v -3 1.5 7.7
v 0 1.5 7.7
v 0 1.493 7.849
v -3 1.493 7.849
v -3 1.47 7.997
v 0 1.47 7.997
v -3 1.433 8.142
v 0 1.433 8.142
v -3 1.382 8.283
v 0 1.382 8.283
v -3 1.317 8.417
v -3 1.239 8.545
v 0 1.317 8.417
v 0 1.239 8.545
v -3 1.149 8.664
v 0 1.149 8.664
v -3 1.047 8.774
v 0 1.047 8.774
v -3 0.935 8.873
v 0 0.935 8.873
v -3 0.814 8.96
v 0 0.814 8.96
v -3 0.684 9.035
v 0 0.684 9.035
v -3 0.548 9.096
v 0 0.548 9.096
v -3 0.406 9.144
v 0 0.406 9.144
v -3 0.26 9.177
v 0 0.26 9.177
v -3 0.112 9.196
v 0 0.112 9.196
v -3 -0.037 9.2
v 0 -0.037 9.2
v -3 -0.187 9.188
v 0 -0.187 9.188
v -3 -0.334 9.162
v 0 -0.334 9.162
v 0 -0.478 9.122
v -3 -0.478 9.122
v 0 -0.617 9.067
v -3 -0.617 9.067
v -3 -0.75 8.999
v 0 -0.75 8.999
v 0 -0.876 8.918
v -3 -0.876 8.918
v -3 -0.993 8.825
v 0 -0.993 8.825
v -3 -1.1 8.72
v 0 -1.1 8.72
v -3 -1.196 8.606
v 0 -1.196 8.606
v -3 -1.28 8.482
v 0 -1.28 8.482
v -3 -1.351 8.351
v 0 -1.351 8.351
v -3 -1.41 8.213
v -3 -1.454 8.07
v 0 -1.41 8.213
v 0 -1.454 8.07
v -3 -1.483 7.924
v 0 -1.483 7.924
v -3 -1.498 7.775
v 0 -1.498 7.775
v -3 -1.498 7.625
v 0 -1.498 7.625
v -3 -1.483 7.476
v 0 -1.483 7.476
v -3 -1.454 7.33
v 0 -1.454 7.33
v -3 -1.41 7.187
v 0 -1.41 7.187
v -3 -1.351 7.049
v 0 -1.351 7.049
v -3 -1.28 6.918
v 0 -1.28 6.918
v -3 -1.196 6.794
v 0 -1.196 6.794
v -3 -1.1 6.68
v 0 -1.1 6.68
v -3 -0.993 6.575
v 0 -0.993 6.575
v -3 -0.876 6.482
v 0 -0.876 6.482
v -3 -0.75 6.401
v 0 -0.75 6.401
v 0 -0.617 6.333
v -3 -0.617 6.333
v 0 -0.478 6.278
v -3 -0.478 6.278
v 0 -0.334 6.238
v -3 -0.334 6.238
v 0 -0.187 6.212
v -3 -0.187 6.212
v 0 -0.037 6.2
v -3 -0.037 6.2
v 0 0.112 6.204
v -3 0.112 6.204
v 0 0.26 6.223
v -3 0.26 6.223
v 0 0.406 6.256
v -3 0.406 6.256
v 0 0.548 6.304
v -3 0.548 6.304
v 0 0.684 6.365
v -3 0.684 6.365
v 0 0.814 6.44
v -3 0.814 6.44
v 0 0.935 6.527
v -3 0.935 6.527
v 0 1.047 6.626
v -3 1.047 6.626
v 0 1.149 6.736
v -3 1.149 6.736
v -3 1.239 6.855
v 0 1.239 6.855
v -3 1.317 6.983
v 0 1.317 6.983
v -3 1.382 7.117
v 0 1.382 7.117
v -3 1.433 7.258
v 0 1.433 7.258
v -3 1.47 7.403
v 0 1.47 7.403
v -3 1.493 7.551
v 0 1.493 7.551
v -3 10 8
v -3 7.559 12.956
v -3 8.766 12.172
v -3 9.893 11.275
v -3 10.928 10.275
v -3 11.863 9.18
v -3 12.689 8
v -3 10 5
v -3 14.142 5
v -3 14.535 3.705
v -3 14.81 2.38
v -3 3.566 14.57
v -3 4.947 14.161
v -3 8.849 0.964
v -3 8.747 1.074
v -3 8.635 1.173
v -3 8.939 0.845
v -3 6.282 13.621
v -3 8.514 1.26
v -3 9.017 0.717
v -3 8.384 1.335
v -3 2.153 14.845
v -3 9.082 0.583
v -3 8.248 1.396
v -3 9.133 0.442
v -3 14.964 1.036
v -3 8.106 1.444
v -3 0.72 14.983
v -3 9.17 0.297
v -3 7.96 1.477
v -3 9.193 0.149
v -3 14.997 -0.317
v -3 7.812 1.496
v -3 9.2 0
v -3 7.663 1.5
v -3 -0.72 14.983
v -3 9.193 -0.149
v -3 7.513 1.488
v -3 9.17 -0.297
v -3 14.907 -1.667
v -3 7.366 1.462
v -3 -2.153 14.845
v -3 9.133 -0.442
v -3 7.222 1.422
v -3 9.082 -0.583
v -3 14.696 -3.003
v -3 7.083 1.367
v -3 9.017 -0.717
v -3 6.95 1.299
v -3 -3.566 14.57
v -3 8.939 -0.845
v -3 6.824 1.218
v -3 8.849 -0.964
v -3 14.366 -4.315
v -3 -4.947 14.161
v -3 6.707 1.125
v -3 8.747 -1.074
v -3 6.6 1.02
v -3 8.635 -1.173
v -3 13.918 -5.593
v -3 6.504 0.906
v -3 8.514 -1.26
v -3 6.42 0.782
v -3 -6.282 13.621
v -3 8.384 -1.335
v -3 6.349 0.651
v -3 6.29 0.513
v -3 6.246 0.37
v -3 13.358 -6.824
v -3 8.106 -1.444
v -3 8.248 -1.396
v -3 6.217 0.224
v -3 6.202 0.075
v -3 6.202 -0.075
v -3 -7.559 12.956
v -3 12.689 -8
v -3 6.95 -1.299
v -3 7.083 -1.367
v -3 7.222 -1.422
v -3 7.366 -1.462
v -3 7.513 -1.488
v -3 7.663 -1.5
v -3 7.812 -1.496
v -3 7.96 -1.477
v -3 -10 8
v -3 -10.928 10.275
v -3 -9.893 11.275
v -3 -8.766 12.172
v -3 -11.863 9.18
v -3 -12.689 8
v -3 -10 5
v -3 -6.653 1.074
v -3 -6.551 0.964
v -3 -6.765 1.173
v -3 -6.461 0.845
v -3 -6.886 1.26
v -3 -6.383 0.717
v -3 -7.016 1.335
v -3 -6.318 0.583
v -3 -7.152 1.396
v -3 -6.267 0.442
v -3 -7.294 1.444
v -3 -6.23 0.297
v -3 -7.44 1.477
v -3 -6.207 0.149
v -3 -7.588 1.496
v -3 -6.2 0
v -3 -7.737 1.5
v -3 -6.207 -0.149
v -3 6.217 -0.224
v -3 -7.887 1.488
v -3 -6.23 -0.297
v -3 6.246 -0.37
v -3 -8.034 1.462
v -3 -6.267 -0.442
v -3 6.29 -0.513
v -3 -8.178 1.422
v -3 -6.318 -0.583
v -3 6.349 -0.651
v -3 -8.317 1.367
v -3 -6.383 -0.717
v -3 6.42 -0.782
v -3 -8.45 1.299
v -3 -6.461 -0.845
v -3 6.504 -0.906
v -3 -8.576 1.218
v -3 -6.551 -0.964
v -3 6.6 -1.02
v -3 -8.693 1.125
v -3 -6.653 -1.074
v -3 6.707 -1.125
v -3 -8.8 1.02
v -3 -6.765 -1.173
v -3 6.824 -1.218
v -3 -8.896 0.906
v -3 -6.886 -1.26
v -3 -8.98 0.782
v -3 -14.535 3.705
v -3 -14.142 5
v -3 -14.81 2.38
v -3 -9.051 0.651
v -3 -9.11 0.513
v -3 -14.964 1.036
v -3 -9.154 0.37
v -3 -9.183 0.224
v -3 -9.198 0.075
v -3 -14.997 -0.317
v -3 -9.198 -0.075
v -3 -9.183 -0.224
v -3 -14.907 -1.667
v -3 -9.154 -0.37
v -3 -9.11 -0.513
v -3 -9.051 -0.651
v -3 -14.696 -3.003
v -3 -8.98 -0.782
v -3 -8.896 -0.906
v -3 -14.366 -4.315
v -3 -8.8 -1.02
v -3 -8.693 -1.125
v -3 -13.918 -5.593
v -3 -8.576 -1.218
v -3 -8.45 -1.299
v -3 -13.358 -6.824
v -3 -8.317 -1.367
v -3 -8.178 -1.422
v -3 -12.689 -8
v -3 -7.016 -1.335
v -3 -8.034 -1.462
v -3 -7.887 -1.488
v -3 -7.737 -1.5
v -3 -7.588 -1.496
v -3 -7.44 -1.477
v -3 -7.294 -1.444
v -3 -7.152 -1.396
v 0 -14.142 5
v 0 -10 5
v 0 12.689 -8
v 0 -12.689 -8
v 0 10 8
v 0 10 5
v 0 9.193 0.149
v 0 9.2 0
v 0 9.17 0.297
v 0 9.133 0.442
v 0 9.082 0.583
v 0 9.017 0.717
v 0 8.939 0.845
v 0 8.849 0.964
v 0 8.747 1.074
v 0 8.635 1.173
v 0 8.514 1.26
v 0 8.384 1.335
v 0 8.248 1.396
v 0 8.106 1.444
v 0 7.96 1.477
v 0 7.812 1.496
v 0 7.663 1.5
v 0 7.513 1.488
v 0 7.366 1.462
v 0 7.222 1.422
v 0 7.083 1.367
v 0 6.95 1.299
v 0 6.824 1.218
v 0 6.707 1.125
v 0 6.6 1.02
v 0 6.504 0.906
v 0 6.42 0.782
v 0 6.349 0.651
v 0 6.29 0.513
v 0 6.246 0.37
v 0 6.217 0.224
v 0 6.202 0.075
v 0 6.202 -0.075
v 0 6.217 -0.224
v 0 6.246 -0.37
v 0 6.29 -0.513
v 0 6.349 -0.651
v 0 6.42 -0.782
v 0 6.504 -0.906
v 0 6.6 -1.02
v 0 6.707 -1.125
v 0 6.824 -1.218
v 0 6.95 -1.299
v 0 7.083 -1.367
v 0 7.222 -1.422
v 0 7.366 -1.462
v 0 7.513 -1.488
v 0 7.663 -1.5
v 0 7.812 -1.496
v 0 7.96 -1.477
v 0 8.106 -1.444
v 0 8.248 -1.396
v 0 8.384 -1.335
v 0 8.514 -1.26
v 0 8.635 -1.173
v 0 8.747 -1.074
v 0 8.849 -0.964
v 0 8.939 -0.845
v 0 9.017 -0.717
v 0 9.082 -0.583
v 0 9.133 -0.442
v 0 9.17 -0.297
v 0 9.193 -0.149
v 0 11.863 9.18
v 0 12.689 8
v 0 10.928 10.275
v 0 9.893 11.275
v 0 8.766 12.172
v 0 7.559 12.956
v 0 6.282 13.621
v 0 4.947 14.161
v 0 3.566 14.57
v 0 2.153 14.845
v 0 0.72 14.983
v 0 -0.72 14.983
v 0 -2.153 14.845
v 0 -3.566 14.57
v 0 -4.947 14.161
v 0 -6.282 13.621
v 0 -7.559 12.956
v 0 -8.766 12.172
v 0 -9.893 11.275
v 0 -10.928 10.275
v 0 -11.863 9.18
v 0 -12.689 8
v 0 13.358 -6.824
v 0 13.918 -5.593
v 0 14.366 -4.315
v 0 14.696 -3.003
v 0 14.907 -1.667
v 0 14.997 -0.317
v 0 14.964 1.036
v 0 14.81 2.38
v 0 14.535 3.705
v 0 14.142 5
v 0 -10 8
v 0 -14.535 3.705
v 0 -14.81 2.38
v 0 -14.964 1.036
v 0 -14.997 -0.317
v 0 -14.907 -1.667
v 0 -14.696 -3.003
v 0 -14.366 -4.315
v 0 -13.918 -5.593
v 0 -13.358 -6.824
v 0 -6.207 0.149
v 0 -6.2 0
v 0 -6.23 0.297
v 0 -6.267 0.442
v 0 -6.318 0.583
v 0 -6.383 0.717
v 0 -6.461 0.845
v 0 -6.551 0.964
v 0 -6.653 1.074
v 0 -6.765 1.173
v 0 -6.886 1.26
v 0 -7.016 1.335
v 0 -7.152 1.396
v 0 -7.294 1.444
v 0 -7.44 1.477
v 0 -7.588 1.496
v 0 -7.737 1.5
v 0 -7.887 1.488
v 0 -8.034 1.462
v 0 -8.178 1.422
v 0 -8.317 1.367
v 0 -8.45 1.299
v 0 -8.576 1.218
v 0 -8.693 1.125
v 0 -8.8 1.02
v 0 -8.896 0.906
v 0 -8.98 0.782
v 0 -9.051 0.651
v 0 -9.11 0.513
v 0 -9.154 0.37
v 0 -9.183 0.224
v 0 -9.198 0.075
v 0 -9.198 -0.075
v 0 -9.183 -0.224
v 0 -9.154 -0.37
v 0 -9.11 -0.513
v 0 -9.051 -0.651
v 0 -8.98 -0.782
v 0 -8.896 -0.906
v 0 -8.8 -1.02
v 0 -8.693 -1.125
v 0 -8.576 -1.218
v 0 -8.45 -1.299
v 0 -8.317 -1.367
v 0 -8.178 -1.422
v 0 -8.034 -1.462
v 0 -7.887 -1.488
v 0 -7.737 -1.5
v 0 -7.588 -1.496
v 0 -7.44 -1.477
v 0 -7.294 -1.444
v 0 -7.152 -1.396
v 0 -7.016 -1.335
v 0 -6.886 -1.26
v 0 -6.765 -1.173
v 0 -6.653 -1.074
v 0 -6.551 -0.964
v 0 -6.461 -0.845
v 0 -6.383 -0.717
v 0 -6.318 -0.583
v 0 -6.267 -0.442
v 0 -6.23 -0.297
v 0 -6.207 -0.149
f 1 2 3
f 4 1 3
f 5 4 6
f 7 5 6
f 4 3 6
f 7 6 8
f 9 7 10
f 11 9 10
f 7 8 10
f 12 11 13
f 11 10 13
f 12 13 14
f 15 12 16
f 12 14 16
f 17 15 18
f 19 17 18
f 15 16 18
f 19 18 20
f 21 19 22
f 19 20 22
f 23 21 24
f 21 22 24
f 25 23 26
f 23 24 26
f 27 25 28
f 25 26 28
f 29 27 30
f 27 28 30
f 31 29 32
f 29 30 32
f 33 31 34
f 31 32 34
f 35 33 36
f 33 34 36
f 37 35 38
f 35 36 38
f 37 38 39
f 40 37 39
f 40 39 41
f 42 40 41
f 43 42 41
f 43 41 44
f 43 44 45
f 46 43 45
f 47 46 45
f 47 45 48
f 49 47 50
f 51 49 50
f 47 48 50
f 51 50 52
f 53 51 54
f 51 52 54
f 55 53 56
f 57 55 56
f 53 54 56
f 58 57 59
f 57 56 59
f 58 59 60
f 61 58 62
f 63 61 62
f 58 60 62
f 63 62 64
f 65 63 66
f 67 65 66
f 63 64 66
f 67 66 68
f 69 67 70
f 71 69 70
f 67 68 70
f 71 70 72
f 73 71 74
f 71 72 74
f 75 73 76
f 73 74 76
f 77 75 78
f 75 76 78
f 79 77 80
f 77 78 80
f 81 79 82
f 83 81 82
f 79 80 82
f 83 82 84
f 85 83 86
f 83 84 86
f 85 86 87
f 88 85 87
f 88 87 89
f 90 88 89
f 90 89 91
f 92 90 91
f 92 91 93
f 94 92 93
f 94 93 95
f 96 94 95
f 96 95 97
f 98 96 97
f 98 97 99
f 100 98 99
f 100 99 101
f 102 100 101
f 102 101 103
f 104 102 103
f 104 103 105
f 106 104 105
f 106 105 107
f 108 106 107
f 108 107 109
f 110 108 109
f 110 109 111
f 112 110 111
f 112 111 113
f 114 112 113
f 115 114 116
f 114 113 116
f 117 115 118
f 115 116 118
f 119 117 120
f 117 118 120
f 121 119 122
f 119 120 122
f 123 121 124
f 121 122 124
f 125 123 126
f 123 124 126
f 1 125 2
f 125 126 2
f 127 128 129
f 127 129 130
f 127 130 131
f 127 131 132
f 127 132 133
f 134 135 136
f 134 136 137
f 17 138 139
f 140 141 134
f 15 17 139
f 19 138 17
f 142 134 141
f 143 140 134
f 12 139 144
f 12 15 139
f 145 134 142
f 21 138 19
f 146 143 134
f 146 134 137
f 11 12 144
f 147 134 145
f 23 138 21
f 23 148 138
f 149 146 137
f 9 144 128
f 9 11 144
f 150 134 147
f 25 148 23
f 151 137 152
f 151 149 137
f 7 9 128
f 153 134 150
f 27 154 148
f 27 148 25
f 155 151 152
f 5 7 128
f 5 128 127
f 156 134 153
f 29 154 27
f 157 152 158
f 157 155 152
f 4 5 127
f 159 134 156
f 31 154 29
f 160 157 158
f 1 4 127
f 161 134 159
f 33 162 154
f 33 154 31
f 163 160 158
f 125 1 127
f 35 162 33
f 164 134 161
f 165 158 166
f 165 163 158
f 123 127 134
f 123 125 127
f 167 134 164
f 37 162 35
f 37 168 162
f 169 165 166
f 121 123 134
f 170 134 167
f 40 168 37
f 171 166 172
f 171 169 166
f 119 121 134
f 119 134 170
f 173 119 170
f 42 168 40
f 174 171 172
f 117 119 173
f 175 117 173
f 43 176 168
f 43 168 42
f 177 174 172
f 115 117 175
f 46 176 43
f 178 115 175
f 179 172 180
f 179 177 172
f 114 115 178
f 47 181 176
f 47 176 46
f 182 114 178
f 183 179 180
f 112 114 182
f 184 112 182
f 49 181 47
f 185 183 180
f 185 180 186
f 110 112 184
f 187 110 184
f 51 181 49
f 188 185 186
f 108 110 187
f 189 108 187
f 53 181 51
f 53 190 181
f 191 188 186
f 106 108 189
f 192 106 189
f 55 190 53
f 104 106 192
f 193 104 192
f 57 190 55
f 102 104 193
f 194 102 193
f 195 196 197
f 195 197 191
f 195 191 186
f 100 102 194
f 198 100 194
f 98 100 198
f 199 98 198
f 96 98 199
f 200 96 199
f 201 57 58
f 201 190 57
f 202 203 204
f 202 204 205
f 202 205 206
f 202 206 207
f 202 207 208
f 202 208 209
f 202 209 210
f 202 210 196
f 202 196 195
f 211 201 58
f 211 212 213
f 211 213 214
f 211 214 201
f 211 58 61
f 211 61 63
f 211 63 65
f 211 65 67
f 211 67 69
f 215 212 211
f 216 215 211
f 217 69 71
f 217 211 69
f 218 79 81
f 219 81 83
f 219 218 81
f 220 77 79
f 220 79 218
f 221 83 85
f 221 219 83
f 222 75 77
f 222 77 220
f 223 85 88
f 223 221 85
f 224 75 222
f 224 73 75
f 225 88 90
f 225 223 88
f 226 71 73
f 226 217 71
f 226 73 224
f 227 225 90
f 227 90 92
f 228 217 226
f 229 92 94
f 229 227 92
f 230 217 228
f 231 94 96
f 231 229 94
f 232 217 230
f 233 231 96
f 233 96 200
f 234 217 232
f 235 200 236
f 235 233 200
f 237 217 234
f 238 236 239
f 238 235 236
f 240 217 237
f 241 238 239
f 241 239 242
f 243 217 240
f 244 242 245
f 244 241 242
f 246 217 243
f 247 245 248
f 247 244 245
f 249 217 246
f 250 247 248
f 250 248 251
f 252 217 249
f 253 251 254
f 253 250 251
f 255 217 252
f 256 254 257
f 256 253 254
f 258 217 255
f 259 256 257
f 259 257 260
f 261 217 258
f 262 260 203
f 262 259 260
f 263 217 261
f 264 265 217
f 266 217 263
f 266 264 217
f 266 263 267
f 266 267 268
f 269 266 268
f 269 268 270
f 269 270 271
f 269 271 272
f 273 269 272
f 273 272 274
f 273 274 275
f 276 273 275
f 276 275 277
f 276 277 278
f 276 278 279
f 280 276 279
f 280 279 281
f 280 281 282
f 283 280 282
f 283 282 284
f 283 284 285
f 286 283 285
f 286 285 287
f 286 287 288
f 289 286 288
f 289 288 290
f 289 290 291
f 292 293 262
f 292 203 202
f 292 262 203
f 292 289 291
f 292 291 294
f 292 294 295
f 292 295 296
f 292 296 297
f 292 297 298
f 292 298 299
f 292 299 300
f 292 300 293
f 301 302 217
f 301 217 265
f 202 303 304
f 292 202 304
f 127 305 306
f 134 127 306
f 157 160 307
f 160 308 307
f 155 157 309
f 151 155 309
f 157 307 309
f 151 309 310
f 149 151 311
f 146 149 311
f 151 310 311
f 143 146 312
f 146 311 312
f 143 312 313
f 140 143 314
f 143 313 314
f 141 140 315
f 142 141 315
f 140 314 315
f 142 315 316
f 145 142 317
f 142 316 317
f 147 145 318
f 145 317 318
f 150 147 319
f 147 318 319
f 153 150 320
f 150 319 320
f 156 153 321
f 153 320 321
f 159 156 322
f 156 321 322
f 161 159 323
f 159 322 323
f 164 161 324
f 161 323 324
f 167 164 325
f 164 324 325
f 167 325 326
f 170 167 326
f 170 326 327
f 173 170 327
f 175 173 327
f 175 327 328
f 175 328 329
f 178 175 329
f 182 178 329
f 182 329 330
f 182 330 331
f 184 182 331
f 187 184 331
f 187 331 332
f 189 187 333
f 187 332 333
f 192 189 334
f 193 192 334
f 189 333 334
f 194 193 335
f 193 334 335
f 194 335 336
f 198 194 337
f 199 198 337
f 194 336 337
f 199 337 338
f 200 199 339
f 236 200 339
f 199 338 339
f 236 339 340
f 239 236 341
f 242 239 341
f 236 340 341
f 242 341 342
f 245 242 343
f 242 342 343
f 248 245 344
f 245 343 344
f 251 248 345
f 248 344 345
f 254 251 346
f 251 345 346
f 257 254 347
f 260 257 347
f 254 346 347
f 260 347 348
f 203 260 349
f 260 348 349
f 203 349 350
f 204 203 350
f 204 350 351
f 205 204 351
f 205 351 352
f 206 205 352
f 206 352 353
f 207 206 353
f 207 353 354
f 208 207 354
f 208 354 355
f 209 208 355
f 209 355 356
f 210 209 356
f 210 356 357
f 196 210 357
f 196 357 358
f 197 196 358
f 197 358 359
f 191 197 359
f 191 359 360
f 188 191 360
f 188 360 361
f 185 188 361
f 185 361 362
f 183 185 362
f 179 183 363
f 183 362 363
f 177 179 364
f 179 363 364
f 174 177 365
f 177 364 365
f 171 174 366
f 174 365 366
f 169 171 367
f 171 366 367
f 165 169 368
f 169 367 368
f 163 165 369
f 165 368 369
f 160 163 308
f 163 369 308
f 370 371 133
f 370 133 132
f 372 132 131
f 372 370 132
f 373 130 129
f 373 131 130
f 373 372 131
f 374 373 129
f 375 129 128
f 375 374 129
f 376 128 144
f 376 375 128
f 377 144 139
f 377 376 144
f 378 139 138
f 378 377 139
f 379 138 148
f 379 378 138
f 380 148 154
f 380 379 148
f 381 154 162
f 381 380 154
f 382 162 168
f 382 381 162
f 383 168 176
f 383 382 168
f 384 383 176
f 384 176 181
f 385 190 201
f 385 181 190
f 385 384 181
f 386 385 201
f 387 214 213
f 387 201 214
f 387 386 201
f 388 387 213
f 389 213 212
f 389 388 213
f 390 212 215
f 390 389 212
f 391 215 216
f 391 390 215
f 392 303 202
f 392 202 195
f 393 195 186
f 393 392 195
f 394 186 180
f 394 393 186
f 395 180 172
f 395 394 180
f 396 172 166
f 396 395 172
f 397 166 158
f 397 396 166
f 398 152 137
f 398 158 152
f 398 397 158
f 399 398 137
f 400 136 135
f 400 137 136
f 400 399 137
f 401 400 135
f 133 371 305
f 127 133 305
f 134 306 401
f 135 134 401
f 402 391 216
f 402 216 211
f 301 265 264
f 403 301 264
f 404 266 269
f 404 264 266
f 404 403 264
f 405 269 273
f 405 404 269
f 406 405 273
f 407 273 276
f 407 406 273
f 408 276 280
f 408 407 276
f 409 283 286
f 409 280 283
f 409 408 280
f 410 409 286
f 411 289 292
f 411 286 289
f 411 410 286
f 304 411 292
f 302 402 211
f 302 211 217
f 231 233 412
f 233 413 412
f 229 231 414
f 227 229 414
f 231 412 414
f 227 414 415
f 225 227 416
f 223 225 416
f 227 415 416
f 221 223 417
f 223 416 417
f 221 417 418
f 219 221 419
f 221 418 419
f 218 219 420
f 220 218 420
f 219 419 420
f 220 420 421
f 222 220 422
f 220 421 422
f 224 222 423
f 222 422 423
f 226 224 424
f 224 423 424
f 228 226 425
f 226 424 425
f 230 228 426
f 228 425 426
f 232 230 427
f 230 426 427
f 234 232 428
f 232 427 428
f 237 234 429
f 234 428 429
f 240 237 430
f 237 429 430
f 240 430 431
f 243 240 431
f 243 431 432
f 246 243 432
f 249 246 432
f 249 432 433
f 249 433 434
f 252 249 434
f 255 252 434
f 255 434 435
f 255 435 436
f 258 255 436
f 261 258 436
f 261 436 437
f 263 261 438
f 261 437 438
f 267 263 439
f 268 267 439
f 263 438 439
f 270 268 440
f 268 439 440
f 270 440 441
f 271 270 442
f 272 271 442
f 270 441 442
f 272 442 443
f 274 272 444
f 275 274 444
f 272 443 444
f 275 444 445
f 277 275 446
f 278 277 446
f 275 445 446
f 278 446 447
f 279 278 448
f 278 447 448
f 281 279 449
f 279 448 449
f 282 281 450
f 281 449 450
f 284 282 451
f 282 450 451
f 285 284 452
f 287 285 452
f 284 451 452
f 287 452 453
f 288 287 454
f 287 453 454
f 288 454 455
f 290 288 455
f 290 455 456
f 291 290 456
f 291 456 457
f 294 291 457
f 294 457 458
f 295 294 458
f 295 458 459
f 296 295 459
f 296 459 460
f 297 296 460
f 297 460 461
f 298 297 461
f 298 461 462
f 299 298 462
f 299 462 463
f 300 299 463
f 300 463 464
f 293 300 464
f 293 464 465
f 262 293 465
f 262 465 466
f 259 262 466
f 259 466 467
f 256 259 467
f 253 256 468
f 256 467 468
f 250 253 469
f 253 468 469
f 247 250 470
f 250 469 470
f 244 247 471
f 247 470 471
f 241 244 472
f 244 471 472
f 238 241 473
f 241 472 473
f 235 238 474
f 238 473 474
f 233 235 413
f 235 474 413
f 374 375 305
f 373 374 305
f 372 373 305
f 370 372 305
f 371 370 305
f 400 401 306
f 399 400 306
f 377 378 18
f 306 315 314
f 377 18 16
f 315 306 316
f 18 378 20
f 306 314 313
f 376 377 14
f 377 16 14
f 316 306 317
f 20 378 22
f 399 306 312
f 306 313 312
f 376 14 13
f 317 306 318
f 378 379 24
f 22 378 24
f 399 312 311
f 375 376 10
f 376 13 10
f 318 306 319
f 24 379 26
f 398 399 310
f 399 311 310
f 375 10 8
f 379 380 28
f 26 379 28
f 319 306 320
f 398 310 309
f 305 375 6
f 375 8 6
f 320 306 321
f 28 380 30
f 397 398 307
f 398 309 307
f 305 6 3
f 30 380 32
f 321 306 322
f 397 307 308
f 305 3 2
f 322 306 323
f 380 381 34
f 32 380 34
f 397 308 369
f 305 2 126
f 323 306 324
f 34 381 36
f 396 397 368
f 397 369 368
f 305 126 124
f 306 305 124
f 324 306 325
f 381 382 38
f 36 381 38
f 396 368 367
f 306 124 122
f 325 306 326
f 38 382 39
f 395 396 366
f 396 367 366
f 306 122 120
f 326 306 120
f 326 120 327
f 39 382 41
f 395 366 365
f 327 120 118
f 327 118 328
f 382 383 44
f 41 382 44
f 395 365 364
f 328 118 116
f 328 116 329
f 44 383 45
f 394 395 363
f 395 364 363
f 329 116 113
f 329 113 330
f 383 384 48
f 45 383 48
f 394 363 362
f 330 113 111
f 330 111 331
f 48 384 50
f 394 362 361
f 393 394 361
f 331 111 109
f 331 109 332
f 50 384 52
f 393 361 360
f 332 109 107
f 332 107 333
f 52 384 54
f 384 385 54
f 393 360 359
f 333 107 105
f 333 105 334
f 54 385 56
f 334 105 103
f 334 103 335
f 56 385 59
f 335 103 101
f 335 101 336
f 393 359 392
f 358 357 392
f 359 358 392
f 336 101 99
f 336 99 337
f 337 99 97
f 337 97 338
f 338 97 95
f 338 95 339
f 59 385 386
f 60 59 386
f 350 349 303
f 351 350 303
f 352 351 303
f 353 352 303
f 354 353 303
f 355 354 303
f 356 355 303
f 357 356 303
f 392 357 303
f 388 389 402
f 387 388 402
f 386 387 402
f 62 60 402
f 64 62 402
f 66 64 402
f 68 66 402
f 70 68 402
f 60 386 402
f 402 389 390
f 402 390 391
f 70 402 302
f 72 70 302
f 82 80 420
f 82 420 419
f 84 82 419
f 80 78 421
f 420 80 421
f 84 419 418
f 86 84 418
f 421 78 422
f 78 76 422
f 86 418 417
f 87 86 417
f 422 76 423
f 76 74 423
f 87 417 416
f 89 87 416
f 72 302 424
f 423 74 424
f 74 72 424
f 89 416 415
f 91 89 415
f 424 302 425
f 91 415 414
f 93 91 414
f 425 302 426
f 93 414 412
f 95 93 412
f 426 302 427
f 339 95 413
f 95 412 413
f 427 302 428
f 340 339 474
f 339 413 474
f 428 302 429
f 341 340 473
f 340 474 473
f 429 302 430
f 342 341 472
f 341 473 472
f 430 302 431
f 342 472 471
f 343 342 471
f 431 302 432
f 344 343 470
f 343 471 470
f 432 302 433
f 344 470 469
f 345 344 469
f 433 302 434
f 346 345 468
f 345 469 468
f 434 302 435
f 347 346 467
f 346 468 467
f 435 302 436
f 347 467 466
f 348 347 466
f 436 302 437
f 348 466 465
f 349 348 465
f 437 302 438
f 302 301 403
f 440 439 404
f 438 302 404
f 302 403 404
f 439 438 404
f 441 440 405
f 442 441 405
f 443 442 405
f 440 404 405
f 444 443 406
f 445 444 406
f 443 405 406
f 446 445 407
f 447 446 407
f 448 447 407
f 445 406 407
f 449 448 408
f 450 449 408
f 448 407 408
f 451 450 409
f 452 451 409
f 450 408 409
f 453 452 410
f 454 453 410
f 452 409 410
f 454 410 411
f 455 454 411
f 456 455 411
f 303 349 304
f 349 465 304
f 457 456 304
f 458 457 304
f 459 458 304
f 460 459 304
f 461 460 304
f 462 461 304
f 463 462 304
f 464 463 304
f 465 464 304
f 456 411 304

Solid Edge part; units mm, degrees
sketch "Sketch1" plane through (0, 0, 0) normal (1, 0, 0) x (0, 1, 0)
  line L0 (12.6886, 8) -> (10, 8)
  line L1 (10, 8) -> (10, 5)
  line L2 (10, 5) -> (14.1421, 5)
  arc A0 (14.1421, 5) -> (12.6886, -8) centre (0, 0) cw
  line L3 (12.6886, -8) -> (-12.6886, -8)
  arc A1 (-12.6886, -8) -> (-14.1421, 5) centre (0, 0) cw
  line L4 (-10, 5) -> (-14.1421, 5)
  line L5 (-10, 8) -> (-10, 5)
  line L6 (-12.6886, 8) -> (-10, 8)
  arc A2 (-12.6886, 8) -> (12.6886, 8) centre (0, 0) cw
  circle A3 centre (0, 7.7) radius 1.5
  circle A4 centre (7.7, 0) radius 1.5
  circle A5 centre (-7.7, 0) radius 1.5
  dimension "D1" = 30
  dimension "D2" = 3
  dimension "D3" = 20
  dimension "D4" = 5
  dimension "D5" = 13
  dimension "D6" = 3
  dimension "D7" = 7.7
  dimension "D8" = 7.7
extrude "Protrusion1" add sketch "Sketch1" against normal blind 3
properties material "Acier"
